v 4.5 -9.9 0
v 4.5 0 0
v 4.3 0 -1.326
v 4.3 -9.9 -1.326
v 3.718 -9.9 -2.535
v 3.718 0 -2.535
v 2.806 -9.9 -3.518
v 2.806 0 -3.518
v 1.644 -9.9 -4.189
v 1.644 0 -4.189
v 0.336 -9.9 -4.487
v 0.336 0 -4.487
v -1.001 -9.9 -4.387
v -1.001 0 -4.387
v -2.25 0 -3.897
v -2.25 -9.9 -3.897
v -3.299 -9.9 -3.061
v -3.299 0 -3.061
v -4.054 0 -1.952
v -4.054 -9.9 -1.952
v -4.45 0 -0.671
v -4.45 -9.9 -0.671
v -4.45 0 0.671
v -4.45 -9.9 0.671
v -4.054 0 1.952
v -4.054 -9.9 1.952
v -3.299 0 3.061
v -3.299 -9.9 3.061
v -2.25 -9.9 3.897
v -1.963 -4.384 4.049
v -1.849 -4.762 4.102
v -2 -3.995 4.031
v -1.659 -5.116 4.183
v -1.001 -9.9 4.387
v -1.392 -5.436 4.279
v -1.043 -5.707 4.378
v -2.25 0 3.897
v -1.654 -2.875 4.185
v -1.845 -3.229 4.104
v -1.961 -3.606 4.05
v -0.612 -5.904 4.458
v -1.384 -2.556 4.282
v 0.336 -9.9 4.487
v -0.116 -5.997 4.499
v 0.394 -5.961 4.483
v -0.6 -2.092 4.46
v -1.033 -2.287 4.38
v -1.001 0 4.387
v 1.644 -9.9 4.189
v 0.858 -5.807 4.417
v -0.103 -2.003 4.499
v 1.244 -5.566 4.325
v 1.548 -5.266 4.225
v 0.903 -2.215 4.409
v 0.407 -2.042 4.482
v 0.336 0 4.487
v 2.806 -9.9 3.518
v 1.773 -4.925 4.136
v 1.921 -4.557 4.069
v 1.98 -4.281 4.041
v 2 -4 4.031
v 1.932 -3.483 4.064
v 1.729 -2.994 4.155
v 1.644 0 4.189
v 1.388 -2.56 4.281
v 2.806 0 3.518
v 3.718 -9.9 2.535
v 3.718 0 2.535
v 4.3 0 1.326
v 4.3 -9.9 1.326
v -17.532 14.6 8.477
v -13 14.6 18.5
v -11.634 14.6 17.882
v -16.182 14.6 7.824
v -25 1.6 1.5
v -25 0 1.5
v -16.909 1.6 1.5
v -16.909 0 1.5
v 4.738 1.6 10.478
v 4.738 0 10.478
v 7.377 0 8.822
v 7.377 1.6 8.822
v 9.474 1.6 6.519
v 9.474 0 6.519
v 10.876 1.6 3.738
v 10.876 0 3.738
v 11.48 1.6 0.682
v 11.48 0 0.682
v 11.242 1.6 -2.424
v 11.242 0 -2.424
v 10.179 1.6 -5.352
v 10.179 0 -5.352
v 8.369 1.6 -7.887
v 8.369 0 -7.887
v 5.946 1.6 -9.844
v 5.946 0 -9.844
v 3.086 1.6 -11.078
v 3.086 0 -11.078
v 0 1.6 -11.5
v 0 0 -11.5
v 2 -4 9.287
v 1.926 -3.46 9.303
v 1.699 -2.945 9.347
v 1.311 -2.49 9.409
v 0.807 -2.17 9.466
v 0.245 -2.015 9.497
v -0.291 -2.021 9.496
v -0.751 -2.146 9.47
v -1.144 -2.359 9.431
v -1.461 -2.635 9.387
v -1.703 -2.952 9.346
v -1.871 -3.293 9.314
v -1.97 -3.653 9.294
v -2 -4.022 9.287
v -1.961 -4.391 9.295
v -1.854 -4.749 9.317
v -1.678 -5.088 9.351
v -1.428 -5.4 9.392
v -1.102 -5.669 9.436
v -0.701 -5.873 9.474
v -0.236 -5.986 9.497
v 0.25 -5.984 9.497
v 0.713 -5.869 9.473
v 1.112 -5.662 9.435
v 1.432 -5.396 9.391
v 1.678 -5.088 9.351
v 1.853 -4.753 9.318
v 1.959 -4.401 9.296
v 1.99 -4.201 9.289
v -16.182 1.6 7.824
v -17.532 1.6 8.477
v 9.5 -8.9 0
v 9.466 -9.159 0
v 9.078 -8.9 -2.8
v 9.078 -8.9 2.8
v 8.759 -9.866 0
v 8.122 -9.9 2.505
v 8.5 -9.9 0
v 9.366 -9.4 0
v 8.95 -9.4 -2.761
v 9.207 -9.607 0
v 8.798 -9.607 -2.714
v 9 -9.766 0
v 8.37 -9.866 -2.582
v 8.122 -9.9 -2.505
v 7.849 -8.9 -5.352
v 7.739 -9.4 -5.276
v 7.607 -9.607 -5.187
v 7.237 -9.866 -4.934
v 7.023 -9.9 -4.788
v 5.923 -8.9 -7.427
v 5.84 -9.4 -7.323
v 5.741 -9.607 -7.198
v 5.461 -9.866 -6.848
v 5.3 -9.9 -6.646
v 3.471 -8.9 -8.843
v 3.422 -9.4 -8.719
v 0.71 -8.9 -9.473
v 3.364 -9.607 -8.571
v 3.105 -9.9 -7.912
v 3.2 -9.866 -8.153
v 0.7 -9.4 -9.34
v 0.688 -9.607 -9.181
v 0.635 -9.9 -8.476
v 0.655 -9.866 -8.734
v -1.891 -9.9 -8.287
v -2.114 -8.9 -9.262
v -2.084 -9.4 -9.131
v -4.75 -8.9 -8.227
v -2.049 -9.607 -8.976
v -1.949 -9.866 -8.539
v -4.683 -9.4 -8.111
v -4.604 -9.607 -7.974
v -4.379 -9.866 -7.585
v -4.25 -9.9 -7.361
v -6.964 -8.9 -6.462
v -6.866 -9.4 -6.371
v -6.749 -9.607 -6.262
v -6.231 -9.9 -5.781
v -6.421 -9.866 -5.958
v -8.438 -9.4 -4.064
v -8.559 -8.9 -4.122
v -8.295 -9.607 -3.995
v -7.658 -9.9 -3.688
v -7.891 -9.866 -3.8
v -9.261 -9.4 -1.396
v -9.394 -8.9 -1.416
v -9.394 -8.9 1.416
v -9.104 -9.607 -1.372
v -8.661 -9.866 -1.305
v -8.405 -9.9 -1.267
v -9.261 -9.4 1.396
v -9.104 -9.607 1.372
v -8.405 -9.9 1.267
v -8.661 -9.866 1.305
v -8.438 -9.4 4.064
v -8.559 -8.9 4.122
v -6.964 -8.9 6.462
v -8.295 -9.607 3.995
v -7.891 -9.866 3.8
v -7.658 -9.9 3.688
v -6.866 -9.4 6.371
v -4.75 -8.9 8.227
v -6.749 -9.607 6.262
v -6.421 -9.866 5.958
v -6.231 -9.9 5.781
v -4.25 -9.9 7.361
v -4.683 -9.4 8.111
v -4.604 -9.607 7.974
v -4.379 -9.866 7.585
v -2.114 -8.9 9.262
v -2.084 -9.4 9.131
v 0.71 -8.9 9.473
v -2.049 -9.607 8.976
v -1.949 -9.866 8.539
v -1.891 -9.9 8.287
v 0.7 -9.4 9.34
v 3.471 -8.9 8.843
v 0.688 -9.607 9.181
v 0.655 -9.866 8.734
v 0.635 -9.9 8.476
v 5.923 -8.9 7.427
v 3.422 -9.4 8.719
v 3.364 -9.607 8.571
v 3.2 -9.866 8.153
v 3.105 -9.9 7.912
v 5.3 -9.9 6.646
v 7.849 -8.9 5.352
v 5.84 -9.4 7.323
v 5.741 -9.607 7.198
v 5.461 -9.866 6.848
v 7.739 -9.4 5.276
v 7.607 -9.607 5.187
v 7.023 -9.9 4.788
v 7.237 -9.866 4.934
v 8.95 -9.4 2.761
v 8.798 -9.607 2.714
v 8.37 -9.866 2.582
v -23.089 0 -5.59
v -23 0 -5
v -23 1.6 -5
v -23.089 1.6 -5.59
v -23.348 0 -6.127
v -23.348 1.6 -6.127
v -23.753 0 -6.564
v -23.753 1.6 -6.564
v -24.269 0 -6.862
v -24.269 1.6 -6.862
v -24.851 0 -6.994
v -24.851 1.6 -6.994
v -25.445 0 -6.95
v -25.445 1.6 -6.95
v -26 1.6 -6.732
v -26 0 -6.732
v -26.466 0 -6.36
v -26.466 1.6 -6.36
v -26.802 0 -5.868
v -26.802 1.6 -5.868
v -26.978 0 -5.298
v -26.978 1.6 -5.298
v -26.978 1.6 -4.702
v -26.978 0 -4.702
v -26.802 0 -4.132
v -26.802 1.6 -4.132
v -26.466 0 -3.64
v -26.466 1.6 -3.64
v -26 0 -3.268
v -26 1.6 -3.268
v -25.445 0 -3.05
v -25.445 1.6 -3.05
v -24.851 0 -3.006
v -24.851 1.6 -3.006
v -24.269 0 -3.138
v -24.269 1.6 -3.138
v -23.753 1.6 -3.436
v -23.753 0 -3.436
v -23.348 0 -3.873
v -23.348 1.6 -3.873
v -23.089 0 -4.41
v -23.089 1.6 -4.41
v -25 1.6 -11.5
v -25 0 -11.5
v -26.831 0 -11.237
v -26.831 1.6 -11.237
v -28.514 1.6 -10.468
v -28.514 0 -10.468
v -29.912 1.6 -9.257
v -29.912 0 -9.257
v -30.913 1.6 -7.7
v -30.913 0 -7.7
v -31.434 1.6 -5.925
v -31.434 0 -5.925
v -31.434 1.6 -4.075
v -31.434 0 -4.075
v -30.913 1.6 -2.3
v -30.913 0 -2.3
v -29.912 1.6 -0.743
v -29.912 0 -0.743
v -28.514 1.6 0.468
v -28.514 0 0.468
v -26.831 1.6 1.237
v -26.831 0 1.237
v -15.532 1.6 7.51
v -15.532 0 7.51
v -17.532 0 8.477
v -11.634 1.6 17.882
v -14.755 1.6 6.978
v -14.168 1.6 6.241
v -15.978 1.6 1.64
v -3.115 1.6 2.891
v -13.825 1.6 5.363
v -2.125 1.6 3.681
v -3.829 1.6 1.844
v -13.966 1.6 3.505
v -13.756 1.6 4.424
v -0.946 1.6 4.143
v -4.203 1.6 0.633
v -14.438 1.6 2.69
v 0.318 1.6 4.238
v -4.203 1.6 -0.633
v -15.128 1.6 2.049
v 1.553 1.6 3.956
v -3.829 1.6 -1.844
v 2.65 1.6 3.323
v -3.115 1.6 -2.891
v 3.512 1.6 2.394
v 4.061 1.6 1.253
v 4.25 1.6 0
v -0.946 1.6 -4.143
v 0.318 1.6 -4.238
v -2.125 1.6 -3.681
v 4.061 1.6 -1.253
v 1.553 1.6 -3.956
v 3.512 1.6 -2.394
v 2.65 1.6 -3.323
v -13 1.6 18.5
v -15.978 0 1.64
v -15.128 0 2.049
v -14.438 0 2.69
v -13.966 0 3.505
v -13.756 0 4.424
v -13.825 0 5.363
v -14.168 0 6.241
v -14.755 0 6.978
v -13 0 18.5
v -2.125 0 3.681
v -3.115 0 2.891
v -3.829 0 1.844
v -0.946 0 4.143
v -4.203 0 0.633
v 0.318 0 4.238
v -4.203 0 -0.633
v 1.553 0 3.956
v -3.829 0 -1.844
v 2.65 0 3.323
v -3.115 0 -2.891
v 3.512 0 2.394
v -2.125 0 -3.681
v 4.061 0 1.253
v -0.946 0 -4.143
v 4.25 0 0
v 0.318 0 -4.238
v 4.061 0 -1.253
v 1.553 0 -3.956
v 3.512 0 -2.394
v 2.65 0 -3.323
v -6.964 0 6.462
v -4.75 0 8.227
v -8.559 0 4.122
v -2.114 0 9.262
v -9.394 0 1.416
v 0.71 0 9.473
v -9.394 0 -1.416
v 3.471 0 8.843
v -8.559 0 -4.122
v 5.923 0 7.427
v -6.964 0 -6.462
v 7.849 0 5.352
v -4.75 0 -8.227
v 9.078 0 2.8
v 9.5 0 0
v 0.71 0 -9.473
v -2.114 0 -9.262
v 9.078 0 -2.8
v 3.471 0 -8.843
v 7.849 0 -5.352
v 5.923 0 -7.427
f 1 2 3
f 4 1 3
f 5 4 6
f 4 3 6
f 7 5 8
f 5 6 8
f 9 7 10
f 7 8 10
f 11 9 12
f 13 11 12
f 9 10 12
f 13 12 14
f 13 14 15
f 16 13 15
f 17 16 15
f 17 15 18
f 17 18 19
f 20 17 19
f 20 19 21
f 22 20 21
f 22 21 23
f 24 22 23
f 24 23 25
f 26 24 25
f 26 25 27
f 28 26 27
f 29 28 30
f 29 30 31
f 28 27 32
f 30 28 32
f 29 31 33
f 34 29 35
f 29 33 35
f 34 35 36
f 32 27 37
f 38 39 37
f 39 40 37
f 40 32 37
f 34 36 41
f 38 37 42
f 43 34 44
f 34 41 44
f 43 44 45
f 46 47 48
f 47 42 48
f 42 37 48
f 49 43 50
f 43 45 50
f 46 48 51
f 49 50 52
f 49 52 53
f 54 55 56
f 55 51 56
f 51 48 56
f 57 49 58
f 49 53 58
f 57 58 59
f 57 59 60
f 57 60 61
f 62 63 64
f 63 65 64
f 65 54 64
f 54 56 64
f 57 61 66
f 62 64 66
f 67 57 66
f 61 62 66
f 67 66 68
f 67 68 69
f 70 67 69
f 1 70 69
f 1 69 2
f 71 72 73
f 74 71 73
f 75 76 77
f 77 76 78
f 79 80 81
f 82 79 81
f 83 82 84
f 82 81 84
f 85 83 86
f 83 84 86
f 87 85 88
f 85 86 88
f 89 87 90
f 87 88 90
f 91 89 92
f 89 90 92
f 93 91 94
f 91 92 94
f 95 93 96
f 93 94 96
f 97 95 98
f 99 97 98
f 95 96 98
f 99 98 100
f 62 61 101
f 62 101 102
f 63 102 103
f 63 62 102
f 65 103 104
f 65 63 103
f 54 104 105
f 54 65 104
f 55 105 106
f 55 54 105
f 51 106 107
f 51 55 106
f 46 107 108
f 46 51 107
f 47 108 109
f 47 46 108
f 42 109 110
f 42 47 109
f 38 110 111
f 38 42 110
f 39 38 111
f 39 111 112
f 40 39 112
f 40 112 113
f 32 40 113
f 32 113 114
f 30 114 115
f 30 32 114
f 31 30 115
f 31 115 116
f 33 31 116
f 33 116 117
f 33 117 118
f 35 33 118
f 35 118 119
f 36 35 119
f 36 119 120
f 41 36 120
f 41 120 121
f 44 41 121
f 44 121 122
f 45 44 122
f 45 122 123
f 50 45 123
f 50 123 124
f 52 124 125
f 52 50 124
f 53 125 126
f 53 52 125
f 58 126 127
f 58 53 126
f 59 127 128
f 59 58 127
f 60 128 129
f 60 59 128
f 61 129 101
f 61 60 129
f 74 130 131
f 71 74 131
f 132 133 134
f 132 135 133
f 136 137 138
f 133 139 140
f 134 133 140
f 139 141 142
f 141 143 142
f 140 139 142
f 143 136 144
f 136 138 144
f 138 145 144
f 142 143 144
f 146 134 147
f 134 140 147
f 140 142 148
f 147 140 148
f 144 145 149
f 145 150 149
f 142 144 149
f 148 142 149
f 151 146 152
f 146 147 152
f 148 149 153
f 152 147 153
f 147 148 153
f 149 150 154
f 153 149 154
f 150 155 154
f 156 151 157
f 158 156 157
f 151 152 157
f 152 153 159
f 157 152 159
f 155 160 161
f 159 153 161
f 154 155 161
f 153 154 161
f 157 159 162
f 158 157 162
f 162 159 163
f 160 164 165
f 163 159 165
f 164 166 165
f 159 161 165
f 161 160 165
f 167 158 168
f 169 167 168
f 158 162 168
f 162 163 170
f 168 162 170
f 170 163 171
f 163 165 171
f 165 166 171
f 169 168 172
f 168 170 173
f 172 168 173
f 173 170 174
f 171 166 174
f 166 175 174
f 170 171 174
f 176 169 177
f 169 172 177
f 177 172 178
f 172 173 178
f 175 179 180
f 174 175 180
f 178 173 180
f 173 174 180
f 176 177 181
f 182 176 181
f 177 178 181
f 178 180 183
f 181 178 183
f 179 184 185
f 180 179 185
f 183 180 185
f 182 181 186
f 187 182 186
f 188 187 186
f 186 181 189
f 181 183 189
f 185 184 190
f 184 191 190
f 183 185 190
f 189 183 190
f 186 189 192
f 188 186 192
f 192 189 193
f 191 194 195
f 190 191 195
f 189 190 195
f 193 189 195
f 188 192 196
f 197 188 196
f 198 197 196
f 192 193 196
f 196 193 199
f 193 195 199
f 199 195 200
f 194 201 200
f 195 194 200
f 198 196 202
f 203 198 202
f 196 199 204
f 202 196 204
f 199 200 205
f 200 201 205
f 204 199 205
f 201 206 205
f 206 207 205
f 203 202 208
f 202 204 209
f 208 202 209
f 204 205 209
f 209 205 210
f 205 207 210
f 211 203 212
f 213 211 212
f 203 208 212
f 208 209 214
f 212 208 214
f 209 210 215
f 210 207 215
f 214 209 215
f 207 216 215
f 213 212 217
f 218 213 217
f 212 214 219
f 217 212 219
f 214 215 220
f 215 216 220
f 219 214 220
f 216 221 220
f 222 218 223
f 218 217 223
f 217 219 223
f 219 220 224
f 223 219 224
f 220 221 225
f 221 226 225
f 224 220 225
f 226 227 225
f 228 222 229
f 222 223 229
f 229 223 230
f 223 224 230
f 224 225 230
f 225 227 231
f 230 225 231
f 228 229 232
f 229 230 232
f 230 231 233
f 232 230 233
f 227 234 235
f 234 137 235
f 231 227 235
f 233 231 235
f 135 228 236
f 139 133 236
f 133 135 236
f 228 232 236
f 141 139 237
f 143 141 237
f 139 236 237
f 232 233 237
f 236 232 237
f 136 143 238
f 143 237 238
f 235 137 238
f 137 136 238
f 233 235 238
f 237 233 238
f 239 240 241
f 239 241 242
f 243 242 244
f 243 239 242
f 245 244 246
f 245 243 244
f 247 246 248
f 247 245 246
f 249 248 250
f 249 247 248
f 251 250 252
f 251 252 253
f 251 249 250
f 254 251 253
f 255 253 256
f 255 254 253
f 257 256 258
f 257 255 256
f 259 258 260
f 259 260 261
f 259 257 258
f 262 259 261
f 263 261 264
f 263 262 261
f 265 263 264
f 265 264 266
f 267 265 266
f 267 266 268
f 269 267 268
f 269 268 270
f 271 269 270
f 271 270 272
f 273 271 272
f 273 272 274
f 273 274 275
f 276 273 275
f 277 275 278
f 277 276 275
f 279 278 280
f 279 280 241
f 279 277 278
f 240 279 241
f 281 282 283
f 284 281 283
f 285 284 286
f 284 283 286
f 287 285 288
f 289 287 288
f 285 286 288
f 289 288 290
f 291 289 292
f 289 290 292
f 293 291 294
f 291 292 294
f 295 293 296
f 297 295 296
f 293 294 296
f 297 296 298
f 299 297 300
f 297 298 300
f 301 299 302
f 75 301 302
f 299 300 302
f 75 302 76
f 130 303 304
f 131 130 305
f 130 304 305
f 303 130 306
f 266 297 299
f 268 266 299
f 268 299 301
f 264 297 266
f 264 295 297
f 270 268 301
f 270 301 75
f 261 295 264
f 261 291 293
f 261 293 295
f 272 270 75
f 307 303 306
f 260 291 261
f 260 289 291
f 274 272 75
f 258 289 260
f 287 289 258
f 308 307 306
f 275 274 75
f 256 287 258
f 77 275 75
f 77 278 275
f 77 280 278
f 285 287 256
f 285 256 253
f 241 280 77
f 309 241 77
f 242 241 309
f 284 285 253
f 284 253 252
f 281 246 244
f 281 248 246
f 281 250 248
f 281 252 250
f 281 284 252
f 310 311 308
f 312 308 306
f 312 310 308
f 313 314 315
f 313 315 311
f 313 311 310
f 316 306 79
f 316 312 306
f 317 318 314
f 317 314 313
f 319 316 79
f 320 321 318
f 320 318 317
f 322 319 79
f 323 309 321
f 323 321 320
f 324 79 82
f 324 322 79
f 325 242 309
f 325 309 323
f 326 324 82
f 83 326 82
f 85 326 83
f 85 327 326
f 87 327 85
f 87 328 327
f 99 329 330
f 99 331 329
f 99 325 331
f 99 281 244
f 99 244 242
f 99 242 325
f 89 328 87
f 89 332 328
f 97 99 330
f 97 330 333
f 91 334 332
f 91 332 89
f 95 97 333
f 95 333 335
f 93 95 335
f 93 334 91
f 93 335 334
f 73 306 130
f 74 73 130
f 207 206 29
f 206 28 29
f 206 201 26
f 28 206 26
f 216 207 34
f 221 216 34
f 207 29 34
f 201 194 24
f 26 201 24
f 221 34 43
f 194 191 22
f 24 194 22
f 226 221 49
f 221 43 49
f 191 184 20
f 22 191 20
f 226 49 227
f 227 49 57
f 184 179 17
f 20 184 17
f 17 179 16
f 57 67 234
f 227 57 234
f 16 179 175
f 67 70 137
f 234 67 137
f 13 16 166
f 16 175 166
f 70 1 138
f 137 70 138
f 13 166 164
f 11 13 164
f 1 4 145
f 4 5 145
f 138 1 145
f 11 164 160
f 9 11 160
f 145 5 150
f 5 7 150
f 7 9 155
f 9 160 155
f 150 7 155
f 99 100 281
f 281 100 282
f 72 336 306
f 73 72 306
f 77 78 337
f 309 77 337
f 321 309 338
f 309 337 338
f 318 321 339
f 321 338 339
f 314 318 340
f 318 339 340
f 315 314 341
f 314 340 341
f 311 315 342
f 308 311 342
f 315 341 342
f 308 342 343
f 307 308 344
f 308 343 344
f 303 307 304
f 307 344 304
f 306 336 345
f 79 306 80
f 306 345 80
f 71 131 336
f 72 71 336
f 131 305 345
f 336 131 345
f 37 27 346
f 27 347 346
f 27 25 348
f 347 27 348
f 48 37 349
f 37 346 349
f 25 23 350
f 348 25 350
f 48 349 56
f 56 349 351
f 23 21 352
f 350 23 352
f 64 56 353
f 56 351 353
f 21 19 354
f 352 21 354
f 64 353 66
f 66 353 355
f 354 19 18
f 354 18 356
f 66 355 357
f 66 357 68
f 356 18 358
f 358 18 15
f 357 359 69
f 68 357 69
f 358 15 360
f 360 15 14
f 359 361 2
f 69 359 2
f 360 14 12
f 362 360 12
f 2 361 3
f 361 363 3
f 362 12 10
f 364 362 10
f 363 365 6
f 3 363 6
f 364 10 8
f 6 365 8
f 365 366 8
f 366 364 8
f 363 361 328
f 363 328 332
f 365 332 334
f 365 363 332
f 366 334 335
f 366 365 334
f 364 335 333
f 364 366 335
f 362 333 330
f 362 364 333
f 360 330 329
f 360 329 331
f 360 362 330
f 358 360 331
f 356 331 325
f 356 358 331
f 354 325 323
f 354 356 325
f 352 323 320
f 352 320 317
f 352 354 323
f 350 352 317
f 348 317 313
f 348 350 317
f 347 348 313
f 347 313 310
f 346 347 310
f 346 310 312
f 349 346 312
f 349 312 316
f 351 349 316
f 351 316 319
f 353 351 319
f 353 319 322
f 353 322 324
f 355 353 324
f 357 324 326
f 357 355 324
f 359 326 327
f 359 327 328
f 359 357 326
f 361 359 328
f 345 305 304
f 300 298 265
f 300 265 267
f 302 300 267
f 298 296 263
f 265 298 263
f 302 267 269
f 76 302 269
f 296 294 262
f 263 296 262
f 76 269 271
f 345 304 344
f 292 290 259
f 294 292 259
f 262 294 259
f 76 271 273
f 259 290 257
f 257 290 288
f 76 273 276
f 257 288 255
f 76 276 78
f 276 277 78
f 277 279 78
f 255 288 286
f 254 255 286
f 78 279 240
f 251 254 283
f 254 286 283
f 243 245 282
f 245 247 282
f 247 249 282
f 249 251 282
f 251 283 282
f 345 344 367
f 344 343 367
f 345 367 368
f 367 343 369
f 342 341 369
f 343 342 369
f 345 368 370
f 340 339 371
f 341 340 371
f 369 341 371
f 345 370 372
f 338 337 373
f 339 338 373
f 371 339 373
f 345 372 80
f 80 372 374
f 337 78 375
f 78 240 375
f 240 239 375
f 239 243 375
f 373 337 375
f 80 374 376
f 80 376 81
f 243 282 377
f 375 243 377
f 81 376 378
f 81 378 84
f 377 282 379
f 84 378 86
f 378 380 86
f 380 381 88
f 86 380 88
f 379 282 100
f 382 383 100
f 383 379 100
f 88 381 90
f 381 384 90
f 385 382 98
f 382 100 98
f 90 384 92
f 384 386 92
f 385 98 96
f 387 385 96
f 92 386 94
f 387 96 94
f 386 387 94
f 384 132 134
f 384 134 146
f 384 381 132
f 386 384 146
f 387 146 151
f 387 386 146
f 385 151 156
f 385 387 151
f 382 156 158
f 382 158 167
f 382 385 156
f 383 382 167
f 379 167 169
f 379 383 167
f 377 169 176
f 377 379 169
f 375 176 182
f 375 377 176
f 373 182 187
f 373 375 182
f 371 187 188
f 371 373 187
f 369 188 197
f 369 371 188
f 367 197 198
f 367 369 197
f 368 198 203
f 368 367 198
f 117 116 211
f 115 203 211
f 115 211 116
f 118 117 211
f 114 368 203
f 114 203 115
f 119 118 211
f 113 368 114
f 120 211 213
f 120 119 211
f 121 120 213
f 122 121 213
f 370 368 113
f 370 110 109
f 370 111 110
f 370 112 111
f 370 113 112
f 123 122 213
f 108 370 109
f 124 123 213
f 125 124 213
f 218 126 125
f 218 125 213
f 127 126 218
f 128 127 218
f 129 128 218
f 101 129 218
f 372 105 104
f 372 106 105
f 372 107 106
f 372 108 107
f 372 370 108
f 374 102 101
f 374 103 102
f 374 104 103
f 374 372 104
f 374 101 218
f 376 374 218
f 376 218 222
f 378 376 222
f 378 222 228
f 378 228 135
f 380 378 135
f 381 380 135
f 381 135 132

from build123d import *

# Parameters (mm, degrees)
ESQUISSE1_R             = 4.25
ESQUISSE1_R_2           = 2
BOSS_EXTRU_1_DEPTH      = 1.6
ESQUISSE2_R             = 9.5
ESQUISSE2_R_2           = 4.5
BOSS_EXTRU_2_DEPTH      = 11.5
CONG_1_R                = 1
BOSS_EXTRU_3_DEPTH      = 13
ESQUISSE4_R             = 2
ENL_V_MAT_EXTRU_1_DEPTH = 19.5


with BuildPart() as part:
    # Esquisse1 → Boss.-Extru.1 (new body)
    with BuildSketch(Plane(origin=(0, 0, 0), x_dir=(1, 0, 0), z_dir=(0, 1, 0))):
        with BuildLine():
            Line((0, 11.5), (-25, 11.5))
            ThreePointArc((-25, 11.5), (-31.5, 5), (-25, -1.5))
            Line((-25, -1.5), (-16.90921754, -1.5))
            ThreePointArc((-16.90921754, -1.5), (-13.826301978, -3.956560509), (-15.532463951, -7.510159982))
            Line((-15.532463951, -7.510159982), (-17.532463951, -8.477187494))
            Line((-17.532463951, -8.477187494), (-13, -18.5))
            Line((-13, -18.5), (4.73848504, -10.478394893))
            ThreePointArc((4.73848504, -10.478394893), (11.241697854, 2.423680954), (0, 11.5))
        make_face()
        Circle(ESQUISSE1_R, mode=Mode.SUBTRACT)
        with Locations((-25, 5)):
            Circle(ESQUISSE1_R_2, mode=Mode.SUBTRACT)
    extrude(amount=BOSS_EXTRU_1_DEPTH)

    # Esquisse2 → Boss.-Extru.2 (add)
    with BuildSketch(Plane(origin=(0, 1.6, 0), x_dir=(1, 0, 0), z_dir=(0, 1, 0))):
        Circle(ESQUISSE2_R)
        Circle(ESQUISSE2_R_2, mode=Mode.SUBTRACT)
    extrude(amount=-BOSS_EXTRU_2_DEPTH)

    # Congé1
    cong_1_edges = [part.edges().sort_by_distance(p)[0] for p in [
        (-9.5, -9.9, 0),
    ]]
    fillet(cong_1_edges, radius=CONG_1_R)

    # Esquisse3 → Boss.-Extru.3 (add)
    with BuildSketch(Plane(origin=(0, 1.6, 0), x_dir=(1, 0, 0), z_dir=(0, 1, 0))):
        Polygon((-17.532463951, -8.477187494), (-13, -18.5), (-11.633703391, -17.88214048), (-16.182035998, -7.824237002), align=None)
    extrude(amount=BOSS_EXTRU_3_DEPTH)

    # Esquisse4 → Enlèv. mat.-Extru.1 (cut, through all)
    with BuildSketch(Plane.XY):
        with Locations((0, -4)):
            Circle(ESQUISSE4_R)
    extrude(amount=ENL_V_MAT_EXTRU_1_DEPTH, mode=Mode.SUBTRACT)


solid = part.part
